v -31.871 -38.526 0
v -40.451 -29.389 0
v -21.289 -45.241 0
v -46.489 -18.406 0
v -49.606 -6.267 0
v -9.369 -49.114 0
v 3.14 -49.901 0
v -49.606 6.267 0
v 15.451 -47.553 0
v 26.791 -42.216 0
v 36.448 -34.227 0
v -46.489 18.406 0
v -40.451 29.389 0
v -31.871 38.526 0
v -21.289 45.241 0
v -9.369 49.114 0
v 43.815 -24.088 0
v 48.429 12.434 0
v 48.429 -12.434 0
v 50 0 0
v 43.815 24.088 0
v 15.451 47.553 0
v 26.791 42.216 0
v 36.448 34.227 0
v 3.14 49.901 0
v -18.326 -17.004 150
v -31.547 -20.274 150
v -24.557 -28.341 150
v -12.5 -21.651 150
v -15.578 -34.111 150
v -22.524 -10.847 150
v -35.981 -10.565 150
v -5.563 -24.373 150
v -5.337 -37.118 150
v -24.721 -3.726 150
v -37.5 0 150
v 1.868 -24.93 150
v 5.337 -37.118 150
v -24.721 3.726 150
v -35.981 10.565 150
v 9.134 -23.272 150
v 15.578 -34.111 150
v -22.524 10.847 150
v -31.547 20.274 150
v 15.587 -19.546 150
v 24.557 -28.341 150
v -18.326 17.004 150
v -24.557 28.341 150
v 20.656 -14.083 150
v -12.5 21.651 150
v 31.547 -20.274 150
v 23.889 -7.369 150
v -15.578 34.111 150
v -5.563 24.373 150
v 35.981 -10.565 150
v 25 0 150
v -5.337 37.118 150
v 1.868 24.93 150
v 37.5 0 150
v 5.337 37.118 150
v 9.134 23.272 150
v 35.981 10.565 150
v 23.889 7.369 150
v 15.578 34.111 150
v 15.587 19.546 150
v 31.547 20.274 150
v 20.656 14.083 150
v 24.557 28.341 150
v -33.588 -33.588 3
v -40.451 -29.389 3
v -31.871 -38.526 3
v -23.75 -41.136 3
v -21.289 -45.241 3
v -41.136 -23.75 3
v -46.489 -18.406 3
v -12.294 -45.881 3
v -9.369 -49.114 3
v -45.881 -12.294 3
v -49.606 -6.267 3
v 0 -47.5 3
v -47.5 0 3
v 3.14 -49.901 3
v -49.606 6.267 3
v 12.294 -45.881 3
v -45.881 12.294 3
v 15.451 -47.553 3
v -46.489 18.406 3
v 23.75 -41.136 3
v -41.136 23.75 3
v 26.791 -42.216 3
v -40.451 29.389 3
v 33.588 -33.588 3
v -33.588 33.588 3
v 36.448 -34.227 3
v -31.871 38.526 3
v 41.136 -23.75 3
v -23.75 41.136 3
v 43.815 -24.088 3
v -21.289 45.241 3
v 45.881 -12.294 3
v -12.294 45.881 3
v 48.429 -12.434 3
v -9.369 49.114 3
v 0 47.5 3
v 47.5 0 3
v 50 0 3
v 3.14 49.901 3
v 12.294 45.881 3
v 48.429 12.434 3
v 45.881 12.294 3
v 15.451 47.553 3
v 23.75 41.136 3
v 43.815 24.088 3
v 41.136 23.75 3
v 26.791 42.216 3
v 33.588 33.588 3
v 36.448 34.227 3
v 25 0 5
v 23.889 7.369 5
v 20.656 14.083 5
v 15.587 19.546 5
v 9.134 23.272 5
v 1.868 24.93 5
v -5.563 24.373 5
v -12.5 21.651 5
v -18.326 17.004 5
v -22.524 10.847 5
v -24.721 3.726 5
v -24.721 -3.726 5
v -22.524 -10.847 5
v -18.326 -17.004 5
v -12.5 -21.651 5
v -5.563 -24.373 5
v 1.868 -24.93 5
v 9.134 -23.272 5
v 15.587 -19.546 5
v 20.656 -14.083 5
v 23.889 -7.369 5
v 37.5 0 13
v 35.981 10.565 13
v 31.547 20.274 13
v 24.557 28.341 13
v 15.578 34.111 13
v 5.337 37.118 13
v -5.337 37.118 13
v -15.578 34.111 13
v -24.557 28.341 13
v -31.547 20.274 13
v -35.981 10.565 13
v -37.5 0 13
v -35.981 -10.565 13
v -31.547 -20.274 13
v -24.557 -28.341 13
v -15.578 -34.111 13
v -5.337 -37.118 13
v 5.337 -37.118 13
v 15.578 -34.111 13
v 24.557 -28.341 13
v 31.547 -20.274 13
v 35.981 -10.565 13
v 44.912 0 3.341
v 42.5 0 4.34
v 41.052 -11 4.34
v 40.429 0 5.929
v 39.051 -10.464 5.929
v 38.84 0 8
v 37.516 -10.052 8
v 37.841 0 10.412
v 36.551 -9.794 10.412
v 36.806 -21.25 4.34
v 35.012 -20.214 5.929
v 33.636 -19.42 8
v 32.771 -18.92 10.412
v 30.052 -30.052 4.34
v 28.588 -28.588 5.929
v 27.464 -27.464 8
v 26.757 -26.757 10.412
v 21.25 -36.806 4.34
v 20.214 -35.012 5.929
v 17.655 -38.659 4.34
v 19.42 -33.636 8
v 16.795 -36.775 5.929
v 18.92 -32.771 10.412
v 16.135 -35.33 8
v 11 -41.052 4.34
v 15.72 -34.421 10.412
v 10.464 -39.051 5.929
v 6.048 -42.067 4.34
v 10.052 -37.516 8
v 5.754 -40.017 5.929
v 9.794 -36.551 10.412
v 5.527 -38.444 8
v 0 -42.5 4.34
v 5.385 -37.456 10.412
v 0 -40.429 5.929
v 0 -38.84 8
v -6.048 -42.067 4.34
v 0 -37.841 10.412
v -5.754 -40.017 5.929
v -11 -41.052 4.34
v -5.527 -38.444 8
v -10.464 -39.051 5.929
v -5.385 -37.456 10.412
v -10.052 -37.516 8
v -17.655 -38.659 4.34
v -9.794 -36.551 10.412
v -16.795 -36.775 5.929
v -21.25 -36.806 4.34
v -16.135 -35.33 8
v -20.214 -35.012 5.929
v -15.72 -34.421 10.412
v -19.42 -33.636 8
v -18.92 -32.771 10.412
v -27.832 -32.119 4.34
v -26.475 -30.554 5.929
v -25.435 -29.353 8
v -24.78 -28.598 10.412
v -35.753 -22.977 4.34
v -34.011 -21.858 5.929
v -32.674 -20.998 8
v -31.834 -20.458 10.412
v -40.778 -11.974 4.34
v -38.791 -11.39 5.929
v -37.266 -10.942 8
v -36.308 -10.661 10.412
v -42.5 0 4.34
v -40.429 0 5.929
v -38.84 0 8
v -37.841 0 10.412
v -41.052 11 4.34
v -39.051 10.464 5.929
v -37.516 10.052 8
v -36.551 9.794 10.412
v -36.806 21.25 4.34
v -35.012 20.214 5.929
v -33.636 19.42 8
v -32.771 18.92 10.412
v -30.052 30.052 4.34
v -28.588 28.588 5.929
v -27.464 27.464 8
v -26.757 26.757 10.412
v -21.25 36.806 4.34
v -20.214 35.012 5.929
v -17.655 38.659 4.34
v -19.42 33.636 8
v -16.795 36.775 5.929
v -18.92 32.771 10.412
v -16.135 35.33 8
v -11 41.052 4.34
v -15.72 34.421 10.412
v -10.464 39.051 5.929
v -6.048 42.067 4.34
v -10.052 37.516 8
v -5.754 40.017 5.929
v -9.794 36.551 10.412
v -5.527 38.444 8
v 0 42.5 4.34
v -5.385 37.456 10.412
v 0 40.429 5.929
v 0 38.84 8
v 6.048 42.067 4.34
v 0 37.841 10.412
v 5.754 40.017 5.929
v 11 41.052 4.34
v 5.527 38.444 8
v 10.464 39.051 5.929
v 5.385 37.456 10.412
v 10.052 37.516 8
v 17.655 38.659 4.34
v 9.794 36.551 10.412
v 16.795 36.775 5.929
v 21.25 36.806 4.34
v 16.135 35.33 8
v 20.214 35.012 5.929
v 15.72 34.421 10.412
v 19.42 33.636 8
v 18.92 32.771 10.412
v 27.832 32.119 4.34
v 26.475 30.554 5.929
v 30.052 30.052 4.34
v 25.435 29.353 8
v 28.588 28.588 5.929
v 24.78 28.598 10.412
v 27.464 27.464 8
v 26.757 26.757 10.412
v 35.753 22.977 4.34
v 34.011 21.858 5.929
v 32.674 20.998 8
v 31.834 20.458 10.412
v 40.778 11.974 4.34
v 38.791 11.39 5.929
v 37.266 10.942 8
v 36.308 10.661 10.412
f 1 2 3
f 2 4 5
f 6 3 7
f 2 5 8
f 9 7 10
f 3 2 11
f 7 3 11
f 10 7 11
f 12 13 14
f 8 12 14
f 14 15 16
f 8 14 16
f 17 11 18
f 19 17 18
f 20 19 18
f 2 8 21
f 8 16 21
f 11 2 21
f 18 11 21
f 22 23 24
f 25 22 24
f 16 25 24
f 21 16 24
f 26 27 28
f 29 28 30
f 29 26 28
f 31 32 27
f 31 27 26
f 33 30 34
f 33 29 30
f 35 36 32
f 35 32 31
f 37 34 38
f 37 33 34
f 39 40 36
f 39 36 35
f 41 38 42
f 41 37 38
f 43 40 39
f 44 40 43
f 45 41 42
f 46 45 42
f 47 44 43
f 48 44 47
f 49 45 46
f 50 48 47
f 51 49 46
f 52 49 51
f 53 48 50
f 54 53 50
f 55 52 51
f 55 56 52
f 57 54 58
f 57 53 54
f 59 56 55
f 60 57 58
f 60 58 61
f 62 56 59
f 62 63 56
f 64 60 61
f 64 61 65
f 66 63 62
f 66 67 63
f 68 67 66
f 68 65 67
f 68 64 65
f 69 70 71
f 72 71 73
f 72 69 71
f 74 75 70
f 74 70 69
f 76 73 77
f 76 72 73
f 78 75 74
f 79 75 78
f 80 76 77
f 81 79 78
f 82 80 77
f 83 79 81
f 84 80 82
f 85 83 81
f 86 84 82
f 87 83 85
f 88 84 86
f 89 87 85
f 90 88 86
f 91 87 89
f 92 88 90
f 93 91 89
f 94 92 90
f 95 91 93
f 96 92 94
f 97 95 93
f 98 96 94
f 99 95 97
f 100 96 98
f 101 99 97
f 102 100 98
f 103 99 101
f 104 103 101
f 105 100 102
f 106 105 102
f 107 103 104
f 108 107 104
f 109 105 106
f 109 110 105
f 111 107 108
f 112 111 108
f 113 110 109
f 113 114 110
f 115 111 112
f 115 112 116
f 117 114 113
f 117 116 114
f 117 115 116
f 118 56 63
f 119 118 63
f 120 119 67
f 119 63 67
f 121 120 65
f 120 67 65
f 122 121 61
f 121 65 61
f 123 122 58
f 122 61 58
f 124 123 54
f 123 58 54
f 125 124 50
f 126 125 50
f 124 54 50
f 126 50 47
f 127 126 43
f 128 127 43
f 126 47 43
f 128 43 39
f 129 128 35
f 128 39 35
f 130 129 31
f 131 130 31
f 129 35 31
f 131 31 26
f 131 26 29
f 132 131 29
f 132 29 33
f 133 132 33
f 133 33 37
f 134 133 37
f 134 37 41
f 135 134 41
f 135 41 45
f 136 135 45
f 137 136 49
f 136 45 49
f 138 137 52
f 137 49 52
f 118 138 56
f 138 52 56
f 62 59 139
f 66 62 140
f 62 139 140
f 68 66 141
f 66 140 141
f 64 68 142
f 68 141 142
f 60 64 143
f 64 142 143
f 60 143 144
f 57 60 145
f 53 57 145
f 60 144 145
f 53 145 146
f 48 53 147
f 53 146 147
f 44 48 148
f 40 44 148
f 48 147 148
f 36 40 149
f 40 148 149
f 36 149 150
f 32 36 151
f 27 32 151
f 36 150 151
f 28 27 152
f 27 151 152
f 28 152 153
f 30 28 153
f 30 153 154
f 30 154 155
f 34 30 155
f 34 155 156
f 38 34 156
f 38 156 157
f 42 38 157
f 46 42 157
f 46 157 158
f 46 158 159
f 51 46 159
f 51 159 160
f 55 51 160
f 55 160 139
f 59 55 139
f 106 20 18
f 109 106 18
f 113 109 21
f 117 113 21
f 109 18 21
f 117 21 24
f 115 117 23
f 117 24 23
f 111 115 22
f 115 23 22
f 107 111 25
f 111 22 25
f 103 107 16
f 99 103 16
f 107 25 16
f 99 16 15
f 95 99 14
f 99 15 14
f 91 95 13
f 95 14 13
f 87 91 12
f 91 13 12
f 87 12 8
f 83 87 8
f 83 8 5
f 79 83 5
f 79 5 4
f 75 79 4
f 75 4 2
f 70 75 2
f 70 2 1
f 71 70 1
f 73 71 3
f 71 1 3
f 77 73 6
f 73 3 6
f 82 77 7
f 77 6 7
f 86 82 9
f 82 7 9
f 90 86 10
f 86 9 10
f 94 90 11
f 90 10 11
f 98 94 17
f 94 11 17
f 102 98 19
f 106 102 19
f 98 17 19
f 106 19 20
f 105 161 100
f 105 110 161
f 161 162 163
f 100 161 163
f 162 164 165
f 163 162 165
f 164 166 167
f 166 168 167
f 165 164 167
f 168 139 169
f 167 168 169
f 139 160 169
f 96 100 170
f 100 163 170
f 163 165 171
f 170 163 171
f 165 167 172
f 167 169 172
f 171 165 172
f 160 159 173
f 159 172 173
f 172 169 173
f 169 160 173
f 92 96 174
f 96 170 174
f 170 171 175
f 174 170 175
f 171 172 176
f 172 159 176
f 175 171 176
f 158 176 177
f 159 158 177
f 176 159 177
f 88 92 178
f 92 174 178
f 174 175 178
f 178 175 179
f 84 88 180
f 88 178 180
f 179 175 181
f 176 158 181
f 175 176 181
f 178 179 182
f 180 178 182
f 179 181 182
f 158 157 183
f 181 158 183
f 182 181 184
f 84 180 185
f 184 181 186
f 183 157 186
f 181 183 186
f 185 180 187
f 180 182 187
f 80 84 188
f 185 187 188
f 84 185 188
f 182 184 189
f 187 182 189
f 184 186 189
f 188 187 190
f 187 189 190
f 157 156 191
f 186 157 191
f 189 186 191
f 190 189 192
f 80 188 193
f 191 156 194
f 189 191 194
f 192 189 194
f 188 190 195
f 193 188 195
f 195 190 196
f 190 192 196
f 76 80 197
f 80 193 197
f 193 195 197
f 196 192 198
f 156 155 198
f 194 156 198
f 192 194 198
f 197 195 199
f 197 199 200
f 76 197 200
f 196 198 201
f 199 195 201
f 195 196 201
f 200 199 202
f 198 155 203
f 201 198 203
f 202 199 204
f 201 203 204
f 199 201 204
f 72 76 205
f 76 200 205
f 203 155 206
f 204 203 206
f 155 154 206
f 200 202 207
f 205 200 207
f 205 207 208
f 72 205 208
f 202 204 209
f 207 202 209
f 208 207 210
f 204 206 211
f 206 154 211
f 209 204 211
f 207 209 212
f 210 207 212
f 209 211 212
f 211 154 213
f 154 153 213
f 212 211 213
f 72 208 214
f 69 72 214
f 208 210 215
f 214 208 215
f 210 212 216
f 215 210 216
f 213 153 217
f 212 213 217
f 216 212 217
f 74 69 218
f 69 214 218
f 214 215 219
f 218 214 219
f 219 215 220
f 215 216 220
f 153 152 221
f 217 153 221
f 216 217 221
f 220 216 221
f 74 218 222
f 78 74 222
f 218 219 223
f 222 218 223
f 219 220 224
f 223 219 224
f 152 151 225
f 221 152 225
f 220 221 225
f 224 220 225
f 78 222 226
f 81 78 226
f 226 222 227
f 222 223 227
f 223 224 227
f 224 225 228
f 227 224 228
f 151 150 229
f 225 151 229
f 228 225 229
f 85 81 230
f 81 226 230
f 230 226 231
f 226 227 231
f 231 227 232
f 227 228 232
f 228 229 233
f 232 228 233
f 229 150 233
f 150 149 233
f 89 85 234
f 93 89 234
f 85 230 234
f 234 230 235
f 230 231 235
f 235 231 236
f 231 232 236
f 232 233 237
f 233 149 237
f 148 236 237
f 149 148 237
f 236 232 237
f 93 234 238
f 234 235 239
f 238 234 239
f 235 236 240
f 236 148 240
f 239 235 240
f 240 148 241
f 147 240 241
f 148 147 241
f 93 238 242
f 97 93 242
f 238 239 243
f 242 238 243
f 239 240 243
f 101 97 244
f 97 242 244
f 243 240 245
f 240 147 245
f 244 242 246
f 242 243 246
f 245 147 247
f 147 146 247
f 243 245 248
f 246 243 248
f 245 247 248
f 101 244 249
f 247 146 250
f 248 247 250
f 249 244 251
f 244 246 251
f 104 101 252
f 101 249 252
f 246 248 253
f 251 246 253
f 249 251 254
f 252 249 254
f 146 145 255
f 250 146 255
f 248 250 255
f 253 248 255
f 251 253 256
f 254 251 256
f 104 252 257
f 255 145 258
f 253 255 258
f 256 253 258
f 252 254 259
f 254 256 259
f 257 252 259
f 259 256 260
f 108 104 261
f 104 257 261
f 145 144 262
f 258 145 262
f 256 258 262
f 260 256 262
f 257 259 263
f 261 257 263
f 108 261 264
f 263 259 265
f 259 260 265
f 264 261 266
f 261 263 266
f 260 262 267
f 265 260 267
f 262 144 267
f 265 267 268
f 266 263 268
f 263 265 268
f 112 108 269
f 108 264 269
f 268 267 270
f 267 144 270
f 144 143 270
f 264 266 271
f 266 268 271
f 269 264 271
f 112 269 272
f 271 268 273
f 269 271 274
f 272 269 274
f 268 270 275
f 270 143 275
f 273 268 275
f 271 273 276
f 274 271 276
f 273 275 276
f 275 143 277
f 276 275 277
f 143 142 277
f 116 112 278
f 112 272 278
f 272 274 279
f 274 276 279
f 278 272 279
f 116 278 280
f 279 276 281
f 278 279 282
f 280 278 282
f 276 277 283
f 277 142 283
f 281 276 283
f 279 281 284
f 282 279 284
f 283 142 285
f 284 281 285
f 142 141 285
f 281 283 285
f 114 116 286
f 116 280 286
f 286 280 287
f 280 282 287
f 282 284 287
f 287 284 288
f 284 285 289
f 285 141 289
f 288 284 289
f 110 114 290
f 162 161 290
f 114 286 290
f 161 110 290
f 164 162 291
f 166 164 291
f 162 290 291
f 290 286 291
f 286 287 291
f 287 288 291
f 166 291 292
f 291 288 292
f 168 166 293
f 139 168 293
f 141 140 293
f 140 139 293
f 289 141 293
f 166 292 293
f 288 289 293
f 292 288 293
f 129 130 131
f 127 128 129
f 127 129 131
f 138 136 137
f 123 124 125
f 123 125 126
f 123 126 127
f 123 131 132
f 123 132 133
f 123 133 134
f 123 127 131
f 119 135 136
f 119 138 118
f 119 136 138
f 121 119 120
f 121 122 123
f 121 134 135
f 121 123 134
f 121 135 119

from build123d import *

# Parameters (mm, degrees)
SKETCH1_R           = 37.5
BOSS_EXTRUDE1_DEPTH = 150
CUT_EXTRUDE1_START  = 150
SKETCH2_R           = 25
CUT_EXTRUDE1_DEPTH  = 145
SKETCH3_R           = 50
BOSS_EXTRUDE2_DEPTH = 3
FILLET1_R           = 10


with BuildPart() as part:
    # Sketch1 → Boss-Extrude1 (new body)
    with BuildSketch(Plane.XY):
        Circle(SKETCH1_R)
    extrude(amount=BOSS_EXTRUDE1_DEPTH)

    # Sketch2 → Cut-Extrude1 (cut)
    with BuildSketch(Plane.XY.offset(CUT_EXTRUDE1_START)):
        Circle(SKETCH2_R)
    extrude(amount=-CUT_EXTRUDE1_DEPTH, mode=Mode.SUBTRACT)

    # Sketch3 → Boss-Extrude2 (add)
    with BuildSketch(Plane.XY):
        Circle(SKETCH3_R)
    extrude(amount=BOSS_EXTRUDE2_DEPTH)

    # Fillet1
    fillet1_edges = [part.edges().sort_by_distance(p)[0] for p in [
        (-37.5, 0, 3),
    ]]
    fillet(fillet1_edges, radius=FILLET1_R)


solid = part.part
